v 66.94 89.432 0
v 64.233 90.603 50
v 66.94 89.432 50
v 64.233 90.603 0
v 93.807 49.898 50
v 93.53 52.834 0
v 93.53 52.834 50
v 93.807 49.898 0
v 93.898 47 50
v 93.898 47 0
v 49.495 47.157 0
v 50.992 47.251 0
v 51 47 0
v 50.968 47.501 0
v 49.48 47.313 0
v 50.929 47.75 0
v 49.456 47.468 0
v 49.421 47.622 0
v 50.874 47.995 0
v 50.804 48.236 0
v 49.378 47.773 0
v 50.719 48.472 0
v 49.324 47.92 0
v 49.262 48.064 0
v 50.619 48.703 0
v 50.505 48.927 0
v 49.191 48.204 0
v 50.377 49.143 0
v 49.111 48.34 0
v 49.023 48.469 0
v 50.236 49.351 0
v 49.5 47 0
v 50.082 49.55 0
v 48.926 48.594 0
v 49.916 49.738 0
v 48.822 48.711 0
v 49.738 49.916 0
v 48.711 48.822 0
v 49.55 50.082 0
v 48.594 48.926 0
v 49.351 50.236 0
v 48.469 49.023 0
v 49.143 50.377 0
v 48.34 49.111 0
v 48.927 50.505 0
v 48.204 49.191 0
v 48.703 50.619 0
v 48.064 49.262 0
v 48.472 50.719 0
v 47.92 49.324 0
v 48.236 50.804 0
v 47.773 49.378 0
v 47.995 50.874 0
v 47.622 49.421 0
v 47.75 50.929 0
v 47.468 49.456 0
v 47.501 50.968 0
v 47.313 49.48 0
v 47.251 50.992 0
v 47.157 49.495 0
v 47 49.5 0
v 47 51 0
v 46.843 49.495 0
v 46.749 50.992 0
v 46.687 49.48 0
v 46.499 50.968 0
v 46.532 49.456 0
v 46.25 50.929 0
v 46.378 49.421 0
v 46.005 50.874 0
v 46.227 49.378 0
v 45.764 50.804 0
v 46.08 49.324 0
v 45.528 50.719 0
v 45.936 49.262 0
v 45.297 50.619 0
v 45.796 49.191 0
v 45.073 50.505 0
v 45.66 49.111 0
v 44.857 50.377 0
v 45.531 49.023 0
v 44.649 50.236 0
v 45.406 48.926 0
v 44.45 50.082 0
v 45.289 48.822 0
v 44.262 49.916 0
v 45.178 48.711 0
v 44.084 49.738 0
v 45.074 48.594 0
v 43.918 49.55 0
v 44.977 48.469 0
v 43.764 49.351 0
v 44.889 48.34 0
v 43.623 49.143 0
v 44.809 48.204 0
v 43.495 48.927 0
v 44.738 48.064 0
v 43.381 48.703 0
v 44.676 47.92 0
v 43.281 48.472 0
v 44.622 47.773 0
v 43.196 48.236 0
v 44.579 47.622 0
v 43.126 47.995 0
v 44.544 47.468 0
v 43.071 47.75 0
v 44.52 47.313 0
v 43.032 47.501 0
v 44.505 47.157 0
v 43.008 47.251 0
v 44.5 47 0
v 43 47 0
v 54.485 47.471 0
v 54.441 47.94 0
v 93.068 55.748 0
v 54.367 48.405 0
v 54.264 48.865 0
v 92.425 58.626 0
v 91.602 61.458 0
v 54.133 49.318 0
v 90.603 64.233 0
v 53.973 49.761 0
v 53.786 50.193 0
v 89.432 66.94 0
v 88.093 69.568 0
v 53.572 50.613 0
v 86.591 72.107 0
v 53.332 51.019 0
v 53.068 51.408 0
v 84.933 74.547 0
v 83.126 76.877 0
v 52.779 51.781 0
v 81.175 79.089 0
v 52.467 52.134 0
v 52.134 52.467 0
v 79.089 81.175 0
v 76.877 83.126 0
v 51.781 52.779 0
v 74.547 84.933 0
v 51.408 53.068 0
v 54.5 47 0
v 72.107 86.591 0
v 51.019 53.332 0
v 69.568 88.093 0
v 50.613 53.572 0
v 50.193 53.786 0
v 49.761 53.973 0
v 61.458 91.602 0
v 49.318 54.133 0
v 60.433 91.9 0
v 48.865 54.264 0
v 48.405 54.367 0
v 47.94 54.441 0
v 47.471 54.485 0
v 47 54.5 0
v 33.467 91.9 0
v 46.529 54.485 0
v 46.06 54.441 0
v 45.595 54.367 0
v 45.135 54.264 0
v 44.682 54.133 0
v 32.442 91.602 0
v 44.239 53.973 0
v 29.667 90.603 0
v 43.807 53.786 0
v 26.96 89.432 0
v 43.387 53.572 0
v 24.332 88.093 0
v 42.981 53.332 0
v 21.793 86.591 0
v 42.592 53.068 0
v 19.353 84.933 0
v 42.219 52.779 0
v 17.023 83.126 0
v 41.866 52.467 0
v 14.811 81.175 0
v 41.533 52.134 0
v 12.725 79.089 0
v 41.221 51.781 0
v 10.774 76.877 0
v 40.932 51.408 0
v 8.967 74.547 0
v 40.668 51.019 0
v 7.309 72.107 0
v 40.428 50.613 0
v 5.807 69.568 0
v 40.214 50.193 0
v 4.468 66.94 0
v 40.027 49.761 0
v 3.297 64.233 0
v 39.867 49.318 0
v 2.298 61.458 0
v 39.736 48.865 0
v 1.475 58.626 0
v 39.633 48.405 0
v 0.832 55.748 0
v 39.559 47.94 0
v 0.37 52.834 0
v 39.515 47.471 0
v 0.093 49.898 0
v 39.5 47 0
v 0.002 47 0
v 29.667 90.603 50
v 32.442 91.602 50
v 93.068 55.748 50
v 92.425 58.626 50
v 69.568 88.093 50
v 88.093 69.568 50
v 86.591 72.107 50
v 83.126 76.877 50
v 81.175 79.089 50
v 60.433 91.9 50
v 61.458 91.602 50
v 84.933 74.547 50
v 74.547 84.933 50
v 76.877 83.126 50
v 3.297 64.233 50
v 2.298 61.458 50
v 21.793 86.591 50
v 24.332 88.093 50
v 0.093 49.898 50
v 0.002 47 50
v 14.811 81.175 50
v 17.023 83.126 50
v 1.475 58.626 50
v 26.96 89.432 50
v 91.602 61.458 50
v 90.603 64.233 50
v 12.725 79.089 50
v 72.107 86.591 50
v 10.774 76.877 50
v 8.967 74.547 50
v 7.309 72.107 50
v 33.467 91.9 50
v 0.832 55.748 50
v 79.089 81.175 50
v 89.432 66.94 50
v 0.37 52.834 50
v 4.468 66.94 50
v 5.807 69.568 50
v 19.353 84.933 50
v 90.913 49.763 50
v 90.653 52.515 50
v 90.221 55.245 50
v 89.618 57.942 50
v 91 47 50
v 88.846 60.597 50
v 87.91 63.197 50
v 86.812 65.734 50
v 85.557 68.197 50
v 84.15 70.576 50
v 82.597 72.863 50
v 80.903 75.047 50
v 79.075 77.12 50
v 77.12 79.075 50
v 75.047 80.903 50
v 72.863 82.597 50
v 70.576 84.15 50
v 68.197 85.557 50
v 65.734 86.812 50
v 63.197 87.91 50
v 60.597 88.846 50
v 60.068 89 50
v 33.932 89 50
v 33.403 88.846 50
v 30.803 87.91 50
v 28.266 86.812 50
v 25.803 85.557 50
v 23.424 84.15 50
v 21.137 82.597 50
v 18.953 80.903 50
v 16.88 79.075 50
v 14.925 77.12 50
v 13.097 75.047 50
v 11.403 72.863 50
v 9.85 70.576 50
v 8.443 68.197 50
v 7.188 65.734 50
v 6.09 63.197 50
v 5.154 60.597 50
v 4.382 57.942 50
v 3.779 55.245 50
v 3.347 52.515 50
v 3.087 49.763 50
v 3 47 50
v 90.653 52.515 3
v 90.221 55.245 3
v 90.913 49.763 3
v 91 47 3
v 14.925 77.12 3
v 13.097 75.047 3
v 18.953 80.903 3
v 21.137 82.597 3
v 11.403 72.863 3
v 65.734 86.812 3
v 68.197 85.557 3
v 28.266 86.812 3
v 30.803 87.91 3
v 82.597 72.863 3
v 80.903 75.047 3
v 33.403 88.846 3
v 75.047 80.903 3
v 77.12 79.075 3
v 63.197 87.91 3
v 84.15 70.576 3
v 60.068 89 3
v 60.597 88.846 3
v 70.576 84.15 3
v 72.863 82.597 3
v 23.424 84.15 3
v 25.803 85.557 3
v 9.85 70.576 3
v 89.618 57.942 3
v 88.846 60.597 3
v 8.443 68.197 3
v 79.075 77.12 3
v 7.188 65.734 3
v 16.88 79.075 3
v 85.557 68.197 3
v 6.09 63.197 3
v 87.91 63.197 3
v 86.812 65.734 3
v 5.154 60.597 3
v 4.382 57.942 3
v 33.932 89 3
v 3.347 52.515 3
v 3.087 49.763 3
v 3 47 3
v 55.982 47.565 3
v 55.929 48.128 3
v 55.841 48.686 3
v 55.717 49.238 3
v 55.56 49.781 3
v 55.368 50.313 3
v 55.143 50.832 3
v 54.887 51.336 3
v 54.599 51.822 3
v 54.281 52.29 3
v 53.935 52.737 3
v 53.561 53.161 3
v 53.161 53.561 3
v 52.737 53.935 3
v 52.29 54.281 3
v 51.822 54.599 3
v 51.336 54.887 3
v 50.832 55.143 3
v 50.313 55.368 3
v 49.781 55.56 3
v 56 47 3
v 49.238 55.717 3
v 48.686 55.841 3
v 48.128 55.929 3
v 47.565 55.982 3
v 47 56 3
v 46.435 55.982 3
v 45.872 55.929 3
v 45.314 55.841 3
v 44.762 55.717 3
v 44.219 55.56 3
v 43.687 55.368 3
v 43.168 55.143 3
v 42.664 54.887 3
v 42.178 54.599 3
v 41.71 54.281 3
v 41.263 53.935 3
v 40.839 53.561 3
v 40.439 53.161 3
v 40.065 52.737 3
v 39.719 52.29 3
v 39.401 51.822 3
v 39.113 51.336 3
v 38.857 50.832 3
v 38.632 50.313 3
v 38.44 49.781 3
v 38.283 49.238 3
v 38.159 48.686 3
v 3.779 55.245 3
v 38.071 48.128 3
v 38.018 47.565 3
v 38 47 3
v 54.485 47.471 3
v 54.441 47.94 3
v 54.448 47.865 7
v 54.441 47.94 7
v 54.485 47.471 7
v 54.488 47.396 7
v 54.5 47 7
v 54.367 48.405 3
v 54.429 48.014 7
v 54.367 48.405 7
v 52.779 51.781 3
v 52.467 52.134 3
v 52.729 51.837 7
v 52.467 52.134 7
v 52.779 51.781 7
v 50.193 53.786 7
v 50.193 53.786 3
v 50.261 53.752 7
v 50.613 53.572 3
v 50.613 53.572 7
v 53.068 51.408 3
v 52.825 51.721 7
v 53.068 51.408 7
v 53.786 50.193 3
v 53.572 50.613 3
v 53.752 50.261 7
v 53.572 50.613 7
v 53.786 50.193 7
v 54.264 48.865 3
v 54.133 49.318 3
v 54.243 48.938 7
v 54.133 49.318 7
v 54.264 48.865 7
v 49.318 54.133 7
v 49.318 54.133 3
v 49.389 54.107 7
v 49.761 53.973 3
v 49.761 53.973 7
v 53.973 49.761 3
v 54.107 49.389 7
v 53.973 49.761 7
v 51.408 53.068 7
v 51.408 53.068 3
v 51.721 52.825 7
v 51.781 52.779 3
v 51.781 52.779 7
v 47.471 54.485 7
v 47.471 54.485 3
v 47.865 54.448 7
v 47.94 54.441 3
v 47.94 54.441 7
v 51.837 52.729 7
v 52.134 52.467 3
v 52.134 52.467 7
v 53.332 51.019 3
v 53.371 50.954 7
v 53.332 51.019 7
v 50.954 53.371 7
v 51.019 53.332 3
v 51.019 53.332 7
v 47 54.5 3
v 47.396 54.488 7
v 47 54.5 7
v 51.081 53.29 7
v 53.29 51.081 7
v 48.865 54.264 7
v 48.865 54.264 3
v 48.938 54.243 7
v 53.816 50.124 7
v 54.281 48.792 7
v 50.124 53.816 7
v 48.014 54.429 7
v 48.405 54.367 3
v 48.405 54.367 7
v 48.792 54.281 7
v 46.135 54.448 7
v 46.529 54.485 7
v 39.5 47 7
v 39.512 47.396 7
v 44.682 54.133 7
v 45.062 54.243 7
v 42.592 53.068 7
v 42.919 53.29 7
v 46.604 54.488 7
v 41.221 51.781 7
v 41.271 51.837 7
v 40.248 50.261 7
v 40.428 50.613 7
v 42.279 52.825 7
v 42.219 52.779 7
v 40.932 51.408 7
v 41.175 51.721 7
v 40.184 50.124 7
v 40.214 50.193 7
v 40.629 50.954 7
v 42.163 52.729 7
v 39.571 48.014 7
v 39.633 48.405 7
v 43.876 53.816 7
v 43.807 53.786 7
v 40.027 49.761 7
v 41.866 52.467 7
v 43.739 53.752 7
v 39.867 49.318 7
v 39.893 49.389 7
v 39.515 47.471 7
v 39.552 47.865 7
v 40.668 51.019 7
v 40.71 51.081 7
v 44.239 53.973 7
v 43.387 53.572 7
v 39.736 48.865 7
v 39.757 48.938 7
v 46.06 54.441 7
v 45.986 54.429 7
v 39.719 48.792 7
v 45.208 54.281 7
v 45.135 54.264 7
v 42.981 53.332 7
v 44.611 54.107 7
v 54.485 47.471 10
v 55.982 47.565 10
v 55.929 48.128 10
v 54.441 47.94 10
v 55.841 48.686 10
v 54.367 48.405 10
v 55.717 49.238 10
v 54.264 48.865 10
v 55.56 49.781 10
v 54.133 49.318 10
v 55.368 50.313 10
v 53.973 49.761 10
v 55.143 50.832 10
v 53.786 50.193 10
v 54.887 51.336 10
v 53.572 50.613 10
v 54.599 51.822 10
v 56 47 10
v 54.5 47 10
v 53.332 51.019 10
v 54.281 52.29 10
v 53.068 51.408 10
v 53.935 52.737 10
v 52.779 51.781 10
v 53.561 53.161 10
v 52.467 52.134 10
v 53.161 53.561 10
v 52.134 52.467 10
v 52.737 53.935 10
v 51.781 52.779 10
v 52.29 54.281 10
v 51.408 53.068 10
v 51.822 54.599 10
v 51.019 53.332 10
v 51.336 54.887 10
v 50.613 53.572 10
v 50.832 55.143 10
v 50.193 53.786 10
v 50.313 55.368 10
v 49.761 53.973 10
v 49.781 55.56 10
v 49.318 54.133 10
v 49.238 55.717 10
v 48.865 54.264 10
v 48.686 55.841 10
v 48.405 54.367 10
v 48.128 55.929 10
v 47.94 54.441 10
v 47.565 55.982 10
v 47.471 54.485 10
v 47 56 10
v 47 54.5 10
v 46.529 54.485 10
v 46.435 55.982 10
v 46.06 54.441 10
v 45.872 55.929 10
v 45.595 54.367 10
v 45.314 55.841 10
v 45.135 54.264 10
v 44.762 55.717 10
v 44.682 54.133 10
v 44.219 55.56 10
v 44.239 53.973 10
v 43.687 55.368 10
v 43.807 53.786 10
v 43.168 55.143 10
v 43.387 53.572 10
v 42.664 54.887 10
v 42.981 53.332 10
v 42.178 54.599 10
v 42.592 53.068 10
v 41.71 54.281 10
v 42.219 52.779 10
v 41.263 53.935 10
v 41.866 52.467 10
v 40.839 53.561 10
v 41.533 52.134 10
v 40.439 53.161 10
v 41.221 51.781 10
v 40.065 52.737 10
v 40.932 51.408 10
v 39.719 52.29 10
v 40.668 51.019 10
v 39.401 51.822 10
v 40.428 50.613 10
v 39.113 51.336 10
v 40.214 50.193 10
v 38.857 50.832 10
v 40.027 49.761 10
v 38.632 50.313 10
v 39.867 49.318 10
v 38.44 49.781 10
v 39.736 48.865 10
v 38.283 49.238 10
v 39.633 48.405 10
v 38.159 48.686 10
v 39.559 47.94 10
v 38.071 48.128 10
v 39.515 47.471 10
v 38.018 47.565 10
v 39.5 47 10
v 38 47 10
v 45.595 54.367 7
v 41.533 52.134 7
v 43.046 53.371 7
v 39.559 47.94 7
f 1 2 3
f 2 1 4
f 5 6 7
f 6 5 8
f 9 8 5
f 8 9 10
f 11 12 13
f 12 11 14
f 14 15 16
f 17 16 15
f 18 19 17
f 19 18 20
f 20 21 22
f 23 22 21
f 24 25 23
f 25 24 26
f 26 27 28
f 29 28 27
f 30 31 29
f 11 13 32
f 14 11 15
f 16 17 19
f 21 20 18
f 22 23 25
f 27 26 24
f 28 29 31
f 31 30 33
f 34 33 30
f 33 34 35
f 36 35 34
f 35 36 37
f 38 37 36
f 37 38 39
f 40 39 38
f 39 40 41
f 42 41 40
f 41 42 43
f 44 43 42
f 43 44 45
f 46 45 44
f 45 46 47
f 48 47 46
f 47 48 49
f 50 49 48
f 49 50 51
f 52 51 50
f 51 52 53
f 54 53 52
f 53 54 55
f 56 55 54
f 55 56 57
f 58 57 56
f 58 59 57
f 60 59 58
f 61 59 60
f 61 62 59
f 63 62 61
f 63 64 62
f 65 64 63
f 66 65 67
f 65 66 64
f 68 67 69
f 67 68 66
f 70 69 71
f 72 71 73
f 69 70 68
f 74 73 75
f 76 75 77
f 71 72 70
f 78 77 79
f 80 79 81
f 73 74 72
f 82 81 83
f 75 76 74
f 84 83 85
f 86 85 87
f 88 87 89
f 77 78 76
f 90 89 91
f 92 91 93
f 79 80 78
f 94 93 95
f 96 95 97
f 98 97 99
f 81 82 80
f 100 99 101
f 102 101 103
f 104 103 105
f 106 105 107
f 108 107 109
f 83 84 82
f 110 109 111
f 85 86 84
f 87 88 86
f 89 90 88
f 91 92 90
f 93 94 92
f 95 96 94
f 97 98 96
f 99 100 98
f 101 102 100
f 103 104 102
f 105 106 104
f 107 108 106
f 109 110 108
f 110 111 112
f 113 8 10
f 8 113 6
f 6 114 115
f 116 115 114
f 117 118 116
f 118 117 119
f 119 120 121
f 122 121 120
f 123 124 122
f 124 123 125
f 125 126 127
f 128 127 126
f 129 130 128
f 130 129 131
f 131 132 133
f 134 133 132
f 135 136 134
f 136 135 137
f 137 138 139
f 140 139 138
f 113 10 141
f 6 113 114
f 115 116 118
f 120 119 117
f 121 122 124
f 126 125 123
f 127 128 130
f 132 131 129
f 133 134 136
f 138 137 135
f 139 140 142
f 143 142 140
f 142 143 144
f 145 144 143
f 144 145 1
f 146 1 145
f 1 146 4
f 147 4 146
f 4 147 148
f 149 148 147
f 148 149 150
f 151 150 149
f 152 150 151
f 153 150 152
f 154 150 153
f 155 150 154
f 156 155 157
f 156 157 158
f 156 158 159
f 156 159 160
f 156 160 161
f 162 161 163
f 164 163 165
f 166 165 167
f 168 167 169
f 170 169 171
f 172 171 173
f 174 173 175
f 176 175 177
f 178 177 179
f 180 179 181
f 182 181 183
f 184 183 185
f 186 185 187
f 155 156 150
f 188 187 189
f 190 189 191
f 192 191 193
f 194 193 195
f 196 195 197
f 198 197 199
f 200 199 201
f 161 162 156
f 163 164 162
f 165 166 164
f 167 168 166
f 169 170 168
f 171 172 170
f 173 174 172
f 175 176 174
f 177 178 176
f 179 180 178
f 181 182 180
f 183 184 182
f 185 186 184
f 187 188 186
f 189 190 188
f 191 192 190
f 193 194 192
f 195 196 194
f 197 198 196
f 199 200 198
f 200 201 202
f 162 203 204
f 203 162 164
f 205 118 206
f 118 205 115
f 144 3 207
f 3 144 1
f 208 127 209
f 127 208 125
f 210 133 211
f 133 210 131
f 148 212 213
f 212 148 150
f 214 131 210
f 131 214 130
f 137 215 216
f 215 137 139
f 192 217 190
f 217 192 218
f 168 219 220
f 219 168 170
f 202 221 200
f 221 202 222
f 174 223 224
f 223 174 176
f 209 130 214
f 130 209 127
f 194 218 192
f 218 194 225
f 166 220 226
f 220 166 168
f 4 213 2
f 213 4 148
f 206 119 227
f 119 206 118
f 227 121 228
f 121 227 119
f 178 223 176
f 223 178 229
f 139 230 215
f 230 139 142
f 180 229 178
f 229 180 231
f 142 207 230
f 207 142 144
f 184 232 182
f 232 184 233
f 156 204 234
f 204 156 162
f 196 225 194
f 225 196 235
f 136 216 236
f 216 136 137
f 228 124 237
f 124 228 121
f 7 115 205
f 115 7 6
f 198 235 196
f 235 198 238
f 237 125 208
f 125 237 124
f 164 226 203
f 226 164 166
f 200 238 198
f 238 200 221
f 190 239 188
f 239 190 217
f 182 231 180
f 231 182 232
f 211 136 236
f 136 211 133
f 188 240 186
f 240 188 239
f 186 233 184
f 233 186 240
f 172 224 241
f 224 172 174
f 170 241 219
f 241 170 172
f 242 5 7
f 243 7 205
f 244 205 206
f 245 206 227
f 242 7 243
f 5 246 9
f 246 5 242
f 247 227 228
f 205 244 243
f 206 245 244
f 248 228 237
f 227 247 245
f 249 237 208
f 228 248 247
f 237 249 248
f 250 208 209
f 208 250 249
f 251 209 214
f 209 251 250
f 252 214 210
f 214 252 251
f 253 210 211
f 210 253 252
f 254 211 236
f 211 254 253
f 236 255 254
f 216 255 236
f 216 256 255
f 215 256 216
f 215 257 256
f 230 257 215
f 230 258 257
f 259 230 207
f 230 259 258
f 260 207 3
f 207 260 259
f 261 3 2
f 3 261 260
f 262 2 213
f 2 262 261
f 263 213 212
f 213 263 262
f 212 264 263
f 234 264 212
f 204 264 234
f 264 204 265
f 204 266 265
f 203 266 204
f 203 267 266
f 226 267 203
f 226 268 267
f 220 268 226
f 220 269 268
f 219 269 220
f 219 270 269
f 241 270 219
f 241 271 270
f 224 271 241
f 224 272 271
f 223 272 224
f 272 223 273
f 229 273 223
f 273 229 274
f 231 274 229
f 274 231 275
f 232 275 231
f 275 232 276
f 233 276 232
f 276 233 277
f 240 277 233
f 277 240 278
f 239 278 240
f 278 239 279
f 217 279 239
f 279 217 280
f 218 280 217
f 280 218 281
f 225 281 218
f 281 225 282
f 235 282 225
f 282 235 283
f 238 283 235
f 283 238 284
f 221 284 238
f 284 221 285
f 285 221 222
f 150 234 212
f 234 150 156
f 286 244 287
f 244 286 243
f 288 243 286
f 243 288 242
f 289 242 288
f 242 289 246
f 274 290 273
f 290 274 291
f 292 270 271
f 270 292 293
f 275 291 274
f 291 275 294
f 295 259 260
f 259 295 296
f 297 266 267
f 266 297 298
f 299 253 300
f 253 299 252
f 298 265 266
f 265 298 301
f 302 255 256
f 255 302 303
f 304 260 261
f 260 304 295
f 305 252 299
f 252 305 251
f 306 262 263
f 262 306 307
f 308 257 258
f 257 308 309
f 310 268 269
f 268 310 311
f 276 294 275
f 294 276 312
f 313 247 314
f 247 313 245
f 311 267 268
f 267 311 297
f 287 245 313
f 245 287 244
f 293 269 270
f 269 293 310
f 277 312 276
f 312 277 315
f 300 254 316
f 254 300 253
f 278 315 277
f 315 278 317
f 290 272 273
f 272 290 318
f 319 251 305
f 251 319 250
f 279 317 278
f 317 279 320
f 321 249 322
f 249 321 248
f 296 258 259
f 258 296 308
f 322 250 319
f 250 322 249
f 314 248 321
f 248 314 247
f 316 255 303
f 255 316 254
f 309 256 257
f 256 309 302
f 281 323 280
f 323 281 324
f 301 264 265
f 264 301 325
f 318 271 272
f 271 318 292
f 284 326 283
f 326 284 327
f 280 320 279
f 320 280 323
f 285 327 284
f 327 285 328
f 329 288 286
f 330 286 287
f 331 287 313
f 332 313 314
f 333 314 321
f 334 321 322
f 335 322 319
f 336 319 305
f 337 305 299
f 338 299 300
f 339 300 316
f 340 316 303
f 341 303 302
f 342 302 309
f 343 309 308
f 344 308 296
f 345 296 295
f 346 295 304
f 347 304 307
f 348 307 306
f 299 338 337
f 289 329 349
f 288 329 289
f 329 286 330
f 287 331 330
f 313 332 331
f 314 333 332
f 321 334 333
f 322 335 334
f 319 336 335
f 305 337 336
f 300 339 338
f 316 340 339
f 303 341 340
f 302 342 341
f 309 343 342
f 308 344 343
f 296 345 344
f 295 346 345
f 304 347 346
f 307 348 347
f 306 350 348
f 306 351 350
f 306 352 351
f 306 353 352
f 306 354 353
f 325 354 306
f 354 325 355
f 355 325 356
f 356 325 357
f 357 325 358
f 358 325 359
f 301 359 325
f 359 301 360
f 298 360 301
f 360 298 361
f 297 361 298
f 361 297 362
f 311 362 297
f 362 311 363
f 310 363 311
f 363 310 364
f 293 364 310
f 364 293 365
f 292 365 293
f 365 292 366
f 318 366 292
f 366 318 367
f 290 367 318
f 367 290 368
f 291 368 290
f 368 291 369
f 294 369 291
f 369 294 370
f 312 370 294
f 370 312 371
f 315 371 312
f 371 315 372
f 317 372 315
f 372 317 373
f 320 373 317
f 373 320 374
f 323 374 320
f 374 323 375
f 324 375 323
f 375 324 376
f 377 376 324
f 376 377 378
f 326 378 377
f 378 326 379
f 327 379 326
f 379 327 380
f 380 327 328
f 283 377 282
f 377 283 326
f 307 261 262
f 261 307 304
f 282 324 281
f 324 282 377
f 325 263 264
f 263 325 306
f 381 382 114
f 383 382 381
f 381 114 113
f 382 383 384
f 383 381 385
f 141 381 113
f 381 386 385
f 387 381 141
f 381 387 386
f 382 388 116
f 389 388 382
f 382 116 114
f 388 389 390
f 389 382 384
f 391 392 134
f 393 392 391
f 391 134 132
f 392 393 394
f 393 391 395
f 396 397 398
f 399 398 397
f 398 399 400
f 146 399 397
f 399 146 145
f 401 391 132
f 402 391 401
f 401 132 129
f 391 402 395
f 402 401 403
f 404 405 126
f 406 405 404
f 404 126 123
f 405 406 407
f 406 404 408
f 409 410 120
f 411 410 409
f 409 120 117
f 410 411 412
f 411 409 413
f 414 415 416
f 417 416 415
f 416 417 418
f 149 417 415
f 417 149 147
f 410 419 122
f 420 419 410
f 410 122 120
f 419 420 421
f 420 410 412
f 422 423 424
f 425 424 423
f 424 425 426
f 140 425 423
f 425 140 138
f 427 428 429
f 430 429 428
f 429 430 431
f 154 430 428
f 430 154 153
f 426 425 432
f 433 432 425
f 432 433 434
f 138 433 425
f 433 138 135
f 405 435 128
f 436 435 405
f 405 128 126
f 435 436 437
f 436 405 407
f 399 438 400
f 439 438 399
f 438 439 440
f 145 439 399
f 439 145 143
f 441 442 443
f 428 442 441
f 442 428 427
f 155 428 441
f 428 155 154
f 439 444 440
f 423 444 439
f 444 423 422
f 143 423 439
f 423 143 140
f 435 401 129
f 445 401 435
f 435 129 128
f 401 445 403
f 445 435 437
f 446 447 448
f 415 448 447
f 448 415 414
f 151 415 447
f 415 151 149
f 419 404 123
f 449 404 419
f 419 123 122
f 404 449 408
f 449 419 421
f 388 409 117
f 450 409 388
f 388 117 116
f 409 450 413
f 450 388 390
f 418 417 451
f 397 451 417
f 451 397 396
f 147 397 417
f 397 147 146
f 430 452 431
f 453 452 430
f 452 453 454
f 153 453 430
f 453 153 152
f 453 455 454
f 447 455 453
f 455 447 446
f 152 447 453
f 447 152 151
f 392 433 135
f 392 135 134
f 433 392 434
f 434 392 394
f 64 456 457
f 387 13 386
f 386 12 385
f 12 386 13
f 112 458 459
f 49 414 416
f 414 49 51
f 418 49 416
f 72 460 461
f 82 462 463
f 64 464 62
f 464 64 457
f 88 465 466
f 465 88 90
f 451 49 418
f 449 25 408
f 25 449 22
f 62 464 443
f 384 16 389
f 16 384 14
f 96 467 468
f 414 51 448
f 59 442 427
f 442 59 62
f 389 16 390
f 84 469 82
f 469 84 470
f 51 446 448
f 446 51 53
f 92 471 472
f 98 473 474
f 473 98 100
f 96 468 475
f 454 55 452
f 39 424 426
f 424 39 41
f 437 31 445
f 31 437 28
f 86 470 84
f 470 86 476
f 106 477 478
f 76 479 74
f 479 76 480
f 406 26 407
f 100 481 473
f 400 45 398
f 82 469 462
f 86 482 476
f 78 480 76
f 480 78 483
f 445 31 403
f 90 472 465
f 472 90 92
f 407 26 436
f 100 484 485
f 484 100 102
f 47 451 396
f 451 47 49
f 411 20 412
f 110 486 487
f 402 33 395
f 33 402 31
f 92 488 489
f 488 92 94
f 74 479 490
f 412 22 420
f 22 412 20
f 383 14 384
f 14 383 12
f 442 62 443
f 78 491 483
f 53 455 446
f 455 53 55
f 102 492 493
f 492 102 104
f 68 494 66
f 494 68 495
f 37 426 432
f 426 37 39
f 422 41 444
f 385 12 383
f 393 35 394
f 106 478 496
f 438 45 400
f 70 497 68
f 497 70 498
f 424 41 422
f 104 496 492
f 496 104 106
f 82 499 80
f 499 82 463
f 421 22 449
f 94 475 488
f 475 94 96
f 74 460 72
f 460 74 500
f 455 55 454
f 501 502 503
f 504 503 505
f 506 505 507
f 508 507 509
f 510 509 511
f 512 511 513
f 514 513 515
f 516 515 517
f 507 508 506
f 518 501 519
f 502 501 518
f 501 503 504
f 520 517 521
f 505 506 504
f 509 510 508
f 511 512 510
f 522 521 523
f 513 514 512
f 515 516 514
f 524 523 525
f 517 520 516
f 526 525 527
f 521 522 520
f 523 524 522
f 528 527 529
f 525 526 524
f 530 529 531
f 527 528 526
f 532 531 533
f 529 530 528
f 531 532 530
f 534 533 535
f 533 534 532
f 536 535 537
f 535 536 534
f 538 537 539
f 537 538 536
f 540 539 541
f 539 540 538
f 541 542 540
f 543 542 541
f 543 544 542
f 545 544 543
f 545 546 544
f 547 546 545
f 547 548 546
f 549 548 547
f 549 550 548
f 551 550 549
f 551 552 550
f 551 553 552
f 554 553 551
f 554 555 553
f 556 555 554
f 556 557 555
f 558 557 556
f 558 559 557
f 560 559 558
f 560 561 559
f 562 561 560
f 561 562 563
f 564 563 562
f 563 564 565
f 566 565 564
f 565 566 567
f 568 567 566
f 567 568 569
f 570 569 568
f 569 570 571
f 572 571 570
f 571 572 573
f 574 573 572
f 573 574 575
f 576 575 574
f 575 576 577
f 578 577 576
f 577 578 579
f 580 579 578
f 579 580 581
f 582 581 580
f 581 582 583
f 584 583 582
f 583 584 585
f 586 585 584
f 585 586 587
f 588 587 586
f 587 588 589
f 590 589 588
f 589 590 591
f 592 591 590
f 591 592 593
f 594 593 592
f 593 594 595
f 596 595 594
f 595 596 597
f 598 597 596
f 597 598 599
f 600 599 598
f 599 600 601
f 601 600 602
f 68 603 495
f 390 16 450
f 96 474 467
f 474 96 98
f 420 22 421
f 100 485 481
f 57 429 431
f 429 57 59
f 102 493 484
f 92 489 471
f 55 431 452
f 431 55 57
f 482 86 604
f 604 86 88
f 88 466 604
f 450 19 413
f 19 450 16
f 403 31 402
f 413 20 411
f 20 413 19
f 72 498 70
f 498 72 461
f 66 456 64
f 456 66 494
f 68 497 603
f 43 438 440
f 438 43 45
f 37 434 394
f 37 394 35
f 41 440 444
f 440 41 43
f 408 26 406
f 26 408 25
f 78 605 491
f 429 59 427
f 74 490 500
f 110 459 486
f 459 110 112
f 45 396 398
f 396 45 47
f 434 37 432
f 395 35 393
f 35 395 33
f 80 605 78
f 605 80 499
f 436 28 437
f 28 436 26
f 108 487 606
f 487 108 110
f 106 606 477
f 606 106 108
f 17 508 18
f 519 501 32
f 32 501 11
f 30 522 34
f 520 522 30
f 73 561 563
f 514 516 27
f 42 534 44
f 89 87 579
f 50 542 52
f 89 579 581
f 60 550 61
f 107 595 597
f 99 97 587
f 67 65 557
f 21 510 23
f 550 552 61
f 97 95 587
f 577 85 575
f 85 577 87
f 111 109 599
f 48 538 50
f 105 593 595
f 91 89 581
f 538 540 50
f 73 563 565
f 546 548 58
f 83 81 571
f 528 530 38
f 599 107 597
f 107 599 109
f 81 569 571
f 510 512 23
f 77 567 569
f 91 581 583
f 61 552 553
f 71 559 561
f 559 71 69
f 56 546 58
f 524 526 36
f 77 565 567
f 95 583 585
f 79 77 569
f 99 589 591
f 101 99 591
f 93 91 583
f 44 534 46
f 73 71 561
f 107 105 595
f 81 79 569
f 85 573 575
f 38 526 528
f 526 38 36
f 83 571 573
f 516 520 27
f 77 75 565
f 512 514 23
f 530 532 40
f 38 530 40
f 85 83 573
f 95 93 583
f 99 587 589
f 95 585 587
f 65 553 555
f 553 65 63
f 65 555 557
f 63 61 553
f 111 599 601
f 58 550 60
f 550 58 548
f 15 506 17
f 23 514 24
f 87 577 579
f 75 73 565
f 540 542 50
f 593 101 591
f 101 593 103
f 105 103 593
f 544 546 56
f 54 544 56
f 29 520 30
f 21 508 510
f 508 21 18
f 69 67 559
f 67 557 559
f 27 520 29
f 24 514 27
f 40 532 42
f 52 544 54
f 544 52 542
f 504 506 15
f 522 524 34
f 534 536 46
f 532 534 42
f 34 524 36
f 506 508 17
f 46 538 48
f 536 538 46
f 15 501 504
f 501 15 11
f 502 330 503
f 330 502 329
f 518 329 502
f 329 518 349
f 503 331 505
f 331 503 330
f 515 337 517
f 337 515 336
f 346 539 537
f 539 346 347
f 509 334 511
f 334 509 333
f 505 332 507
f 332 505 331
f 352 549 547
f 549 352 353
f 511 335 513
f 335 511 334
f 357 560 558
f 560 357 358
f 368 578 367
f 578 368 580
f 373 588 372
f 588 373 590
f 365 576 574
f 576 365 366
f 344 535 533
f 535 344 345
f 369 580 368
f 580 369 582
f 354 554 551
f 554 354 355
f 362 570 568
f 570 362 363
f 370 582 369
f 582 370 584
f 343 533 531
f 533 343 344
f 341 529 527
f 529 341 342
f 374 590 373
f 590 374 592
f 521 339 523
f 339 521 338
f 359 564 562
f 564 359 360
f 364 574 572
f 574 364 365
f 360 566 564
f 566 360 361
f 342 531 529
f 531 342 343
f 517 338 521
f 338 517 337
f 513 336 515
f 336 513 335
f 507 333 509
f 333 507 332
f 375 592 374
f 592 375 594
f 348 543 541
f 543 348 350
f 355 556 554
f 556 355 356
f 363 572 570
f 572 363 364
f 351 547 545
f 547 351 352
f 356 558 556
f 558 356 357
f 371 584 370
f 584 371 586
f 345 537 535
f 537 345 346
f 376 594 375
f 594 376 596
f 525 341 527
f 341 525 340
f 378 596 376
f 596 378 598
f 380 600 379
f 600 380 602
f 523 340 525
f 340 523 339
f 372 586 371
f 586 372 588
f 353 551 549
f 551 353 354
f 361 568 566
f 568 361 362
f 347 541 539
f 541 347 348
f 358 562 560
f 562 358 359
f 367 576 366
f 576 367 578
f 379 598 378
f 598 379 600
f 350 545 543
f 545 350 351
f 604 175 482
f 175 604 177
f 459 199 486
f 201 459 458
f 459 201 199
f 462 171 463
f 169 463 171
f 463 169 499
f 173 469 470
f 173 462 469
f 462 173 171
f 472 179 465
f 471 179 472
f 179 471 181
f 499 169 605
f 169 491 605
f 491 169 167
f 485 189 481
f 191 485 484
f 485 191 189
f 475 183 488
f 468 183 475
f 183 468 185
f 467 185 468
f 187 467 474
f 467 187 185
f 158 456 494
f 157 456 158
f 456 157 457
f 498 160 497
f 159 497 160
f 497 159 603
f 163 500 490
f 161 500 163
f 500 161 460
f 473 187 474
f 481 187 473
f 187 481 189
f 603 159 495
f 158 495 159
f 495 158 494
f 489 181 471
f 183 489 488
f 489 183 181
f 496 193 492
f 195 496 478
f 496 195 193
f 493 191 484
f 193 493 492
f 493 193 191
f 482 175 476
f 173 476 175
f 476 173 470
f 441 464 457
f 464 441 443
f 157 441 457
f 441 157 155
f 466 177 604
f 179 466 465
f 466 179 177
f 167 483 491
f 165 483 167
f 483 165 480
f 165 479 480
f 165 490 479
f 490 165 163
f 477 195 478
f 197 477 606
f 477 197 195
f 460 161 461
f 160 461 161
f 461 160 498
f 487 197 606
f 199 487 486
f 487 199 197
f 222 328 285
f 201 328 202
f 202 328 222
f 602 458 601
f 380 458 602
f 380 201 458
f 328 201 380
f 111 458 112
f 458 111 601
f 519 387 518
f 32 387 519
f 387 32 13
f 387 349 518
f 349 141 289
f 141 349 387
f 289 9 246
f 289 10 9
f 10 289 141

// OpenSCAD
realH = 50;
fakeH = 100;
thickness= 3;
l=2;
diameter = 100;
drainOd = 15;
drainId = 5;
tolerance = 0.1;

$fn=100;

twoThickness = thickness * 2;
inDiam = diameter - twoThickness;

difference(){
inPot();

//slice for viewing
        cube([inDiam,inDiam/2,realH]);
}

module pot(){
    difference(){
        dcylinder(h = fakeH, d = diameter,s = l);
        
        translate([thickness,thickness,thickness])
            dcylinder(h = fakeH, d = inDiam, s= l);
    }
}

module inPot(){

    //pot with hole
    difference(){
        dcylinder(h = realH, d = inDiam-tolerance,s = l);

        translate([thickness,thickness,thickness])
            dcylinder(h = realH, d = inDiam - twoThickness, s= l);


        //drain hole
        translate([inDiam/2,inDiam/2,-tolerance/2])
            cylinder(h = thickness+tolerance, d = drainOd);
    }


    //drain connector
        //V
        color("red")
        translate([inDiam/2,inDiam/2,0])
        difference() {
            cylinder(d1=drainId + thickness, d2 = drainOd+ thickness, h = drainOd -drainId);
            cylinder(d1=drainId, d2= drainOd, h= drainOd -drainId);
        }

        //Drain neck
        translate([inDiam/2,inDiam/2,0])
        difference(){
            cylinder(d=drainOd+thickness, h = drainOd -drainId);
            cylinder(d=drainOd, h = drainOd -drainId);
        }

    
}

module dcylinder(d,h,s){
    intersection(){
        translate([d/2,d/2,0])
        cylinder(h=h,d=d);
        cube([d,d-s,h]);
    }
}
